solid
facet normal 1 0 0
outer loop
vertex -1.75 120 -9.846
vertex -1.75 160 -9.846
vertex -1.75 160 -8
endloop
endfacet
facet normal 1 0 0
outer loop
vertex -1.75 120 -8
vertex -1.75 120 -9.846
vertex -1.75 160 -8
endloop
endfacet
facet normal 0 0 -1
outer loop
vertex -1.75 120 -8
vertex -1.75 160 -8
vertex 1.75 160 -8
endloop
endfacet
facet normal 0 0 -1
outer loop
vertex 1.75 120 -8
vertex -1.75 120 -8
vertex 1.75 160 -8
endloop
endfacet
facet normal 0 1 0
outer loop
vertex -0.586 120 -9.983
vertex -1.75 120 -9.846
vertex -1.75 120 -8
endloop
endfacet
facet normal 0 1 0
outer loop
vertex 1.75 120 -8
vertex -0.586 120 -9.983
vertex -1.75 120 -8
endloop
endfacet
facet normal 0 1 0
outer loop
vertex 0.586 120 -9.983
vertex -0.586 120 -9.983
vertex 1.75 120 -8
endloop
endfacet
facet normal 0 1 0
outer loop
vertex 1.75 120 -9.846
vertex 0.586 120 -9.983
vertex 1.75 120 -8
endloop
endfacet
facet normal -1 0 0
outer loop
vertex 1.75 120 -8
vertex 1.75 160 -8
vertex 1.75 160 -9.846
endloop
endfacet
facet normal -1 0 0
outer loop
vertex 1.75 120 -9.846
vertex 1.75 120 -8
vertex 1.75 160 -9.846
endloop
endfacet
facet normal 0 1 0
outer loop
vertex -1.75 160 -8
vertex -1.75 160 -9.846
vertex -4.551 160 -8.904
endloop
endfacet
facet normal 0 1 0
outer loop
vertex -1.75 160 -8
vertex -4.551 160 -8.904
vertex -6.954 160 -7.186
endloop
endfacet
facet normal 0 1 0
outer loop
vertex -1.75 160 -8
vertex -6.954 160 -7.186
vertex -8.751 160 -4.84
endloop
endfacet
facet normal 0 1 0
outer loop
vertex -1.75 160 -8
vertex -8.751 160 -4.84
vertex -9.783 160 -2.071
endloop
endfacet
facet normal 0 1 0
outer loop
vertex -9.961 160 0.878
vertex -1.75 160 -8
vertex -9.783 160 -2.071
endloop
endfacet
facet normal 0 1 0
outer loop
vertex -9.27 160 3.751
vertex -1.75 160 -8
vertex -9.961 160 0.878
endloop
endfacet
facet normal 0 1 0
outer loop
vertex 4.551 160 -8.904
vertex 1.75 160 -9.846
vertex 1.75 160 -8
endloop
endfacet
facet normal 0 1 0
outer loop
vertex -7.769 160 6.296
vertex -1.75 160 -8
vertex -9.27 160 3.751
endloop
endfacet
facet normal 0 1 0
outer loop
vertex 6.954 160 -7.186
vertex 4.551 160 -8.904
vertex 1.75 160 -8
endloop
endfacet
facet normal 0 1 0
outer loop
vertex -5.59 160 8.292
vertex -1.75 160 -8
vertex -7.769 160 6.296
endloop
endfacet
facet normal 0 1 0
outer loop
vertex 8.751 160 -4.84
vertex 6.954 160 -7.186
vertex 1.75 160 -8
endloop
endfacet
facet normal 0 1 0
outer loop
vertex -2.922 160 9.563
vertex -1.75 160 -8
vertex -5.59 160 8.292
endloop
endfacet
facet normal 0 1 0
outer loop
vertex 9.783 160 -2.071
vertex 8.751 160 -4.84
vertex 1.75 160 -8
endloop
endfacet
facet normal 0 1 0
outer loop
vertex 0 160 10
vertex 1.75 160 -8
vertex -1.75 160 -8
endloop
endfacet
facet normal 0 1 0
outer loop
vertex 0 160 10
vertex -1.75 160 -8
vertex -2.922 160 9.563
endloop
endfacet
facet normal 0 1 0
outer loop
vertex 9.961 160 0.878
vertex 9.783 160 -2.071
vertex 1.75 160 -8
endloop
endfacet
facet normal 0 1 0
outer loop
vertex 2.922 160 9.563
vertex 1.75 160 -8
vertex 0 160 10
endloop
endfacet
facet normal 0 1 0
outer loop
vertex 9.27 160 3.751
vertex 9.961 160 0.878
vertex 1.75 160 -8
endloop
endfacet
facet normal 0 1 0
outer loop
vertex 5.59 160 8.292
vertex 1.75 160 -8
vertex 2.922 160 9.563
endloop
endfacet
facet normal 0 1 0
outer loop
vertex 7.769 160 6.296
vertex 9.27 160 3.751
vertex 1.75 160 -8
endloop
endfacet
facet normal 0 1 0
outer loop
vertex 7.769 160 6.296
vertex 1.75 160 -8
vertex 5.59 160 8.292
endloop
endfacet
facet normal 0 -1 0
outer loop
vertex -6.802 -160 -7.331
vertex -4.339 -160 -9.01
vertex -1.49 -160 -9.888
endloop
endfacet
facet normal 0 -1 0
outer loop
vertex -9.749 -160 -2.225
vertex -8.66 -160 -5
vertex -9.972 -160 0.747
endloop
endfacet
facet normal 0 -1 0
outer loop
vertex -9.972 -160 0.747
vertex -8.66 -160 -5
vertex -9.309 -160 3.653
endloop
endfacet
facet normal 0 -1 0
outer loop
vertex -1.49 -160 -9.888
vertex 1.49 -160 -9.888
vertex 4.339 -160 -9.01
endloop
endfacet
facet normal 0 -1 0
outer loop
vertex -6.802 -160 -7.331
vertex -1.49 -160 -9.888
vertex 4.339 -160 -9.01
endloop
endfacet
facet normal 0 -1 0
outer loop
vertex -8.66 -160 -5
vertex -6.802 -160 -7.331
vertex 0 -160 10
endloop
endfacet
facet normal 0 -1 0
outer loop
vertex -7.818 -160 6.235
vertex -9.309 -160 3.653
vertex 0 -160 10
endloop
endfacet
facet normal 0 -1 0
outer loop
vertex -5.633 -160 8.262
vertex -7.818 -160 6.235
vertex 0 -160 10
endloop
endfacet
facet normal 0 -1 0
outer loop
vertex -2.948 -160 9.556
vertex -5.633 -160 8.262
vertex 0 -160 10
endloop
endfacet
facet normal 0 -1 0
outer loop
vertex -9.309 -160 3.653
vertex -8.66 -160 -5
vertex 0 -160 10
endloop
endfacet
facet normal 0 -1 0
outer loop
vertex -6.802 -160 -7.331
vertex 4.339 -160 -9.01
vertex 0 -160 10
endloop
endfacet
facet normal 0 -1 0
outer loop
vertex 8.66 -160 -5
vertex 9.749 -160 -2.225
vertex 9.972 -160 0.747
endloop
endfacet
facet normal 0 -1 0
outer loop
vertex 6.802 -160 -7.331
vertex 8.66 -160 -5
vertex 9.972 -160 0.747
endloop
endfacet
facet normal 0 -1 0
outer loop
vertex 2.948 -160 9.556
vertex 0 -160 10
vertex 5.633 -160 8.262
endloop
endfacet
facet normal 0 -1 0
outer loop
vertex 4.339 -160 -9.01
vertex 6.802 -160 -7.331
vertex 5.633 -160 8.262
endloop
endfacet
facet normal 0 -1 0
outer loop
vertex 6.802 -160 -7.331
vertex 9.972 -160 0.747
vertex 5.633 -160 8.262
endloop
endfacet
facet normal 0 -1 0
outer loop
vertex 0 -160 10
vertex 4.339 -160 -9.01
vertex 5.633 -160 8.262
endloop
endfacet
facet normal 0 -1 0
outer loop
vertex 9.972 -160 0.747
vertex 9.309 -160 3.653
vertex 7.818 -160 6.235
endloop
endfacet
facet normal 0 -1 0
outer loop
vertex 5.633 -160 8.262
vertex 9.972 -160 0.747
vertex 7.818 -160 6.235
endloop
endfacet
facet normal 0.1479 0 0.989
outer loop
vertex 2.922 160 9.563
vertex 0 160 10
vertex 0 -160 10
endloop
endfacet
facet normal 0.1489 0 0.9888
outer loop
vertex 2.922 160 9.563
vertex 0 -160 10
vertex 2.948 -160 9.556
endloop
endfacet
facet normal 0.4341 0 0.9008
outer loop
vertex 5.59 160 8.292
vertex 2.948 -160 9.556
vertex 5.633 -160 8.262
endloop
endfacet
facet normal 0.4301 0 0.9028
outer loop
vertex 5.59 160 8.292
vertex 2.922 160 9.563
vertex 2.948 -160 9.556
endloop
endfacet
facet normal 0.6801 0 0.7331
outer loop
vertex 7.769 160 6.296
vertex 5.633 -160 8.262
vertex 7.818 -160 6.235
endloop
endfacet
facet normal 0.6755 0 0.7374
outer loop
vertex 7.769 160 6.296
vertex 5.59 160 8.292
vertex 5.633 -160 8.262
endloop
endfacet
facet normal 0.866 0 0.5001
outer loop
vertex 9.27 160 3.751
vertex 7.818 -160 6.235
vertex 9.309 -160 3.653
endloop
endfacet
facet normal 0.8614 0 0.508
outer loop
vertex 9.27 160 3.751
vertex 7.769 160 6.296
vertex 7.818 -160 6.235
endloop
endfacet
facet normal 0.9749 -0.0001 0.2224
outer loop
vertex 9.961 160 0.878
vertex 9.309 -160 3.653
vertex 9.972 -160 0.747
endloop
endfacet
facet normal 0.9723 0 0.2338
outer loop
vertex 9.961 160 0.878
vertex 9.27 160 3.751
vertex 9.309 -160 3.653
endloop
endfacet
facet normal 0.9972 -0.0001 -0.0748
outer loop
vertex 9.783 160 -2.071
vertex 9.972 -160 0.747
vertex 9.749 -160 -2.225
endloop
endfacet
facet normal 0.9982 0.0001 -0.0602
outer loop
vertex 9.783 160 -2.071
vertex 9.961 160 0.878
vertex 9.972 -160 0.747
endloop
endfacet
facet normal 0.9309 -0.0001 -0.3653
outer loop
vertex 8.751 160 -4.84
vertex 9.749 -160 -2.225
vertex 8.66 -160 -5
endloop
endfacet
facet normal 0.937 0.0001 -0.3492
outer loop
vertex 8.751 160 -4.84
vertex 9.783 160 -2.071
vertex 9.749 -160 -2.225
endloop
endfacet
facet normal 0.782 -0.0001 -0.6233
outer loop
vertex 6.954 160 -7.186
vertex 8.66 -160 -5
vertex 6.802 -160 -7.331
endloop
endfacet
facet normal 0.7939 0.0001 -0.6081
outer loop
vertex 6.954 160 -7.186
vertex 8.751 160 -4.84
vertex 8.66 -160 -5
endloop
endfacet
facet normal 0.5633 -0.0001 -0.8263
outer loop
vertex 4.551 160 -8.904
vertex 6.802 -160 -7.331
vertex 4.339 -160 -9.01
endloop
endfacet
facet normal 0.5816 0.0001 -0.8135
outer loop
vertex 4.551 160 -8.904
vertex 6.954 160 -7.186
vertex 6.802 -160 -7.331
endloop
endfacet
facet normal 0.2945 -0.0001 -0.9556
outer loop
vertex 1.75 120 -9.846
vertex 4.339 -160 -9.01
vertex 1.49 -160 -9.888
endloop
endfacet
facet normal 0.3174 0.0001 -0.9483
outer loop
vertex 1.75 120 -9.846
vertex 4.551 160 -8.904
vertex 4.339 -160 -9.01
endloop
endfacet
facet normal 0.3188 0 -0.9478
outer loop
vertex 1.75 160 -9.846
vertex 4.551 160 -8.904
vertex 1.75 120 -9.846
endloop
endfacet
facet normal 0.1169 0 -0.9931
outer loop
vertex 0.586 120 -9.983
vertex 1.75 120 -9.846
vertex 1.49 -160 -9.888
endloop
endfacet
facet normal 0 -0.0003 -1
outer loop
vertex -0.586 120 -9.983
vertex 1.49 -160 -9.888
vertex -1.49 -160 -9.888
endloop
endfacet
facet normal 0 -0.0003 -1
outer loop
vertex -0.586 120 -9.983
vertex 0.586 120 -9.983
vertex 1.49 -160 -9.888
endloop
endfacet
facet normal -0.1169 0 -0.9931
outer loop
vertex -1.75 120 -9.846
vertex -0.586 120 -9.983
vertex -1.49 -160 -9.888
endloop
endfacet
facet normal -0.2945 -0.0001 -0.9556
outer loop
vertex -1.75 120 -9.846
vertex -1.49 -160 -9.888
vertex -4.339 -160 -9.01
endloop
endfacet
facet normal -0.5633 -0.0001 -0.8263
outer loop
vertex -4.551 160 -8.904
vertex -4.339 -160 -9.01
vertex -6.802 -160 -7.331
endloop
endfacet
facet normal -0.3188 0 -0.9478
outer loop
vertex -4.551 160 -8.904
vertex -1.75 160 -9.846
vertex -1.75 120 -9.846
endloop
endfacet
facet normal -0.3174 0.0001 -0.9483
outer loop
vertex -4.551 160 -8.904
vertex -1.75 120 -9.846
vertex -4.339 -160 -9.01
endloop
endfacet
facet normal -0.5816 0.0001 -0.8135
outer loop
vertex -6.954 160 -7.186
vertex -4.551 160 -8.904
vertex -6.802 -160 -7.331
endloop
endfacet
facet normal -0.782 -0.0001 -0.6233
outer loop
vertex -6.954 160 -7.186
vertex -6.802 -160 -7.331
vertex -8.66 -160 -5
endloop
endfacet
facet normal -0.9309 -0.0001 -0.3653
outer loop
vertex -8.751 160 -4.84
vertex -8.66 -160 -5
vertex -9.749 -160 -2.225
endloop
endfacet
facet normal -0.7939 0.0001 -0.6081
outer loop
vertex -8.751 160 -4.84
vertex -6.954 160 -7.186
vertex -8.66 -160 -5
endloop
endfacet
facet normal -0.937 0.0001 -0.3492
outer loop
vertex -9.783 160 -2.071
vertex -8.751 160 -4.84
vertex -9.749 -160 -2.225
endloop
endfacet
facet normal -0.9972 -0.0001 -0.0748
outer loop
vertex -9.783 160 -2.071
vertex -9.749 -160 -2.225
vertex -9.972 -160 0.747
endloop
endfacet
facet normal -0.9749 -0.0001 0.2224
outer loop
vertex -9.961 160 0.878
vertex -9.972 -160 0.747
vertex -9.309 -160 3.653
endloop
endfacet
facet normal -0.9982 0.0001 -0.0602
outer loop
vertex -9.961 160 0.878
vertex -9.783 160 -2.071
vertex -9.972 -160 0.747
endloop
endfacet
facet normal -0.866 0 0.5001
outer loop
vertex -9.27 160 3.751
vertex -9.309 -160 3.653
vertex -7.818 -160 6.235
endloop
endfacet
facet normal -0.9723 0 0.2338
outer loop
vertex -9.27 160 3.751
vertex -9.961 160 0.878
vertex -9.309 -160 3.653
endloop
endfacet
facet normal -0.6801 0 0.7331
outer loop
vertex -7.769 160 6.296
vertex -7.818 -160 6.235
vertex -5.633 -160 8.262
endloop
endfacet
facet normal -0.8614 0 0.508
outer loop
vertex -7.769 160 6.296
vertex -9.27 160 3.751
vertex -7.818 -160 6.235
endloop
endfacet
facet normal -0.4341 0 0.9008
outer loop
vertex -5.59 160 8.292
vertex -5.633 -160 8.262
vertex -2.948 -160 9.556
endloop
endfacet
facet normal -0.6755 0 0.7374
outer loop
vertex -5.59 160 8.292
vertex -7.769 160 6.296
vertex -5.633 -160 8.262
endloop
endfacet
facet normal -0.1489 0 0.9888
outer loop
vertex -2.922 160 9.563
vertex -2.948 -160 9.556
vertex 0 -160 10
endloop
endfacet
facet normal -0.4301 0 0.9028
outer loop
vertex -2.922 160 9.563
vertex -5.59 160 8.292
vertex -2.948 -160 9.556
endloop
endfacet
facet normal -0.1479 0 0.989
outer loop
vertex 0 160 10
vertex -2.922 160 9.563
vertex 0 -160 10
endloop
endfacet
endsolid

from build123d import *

# Parameters (mm, degrees)
SKETCH1_R           = 10
BOSS_EXTRUDE1_DEPTH = 160
CUT_EXTRUDE1_DEPTH  = 40


with BuildPart() as part:
    # Sketch1 → Boss-Extrude1 (new, symmetric)
    with BuildSketch(Plane(origin=(0, 0, 0), x_dir=(1, 0, 0), z_dir=(0, 1, 0))):
        with Locations(Location((0, 0, 0), (0, 0, 270))):
            Circle(SKETCH1_R)
    extrude(amount=BOSS_EXTRUDE1_DEPTH, both=True)

    # Sketch2 → Cut-Extrude1 (cut)
    with BuildSketch(Plane(origin=(0, 160, 0), x_dir=(1, 0, 0), z_dir=(0, 1, 0))):
        Polygon((-1.75, 9.845684334), (-1.75, 8), (1.75, 8), (1.75, 9.845684334), (1.75, 11.147310955), (-1.75, 11.147310955), align=None)
    extrude(amount=-CUT_EXTRUDE1_DEPTH, mode=Mode.SUBTRACT)


solid = part.part
